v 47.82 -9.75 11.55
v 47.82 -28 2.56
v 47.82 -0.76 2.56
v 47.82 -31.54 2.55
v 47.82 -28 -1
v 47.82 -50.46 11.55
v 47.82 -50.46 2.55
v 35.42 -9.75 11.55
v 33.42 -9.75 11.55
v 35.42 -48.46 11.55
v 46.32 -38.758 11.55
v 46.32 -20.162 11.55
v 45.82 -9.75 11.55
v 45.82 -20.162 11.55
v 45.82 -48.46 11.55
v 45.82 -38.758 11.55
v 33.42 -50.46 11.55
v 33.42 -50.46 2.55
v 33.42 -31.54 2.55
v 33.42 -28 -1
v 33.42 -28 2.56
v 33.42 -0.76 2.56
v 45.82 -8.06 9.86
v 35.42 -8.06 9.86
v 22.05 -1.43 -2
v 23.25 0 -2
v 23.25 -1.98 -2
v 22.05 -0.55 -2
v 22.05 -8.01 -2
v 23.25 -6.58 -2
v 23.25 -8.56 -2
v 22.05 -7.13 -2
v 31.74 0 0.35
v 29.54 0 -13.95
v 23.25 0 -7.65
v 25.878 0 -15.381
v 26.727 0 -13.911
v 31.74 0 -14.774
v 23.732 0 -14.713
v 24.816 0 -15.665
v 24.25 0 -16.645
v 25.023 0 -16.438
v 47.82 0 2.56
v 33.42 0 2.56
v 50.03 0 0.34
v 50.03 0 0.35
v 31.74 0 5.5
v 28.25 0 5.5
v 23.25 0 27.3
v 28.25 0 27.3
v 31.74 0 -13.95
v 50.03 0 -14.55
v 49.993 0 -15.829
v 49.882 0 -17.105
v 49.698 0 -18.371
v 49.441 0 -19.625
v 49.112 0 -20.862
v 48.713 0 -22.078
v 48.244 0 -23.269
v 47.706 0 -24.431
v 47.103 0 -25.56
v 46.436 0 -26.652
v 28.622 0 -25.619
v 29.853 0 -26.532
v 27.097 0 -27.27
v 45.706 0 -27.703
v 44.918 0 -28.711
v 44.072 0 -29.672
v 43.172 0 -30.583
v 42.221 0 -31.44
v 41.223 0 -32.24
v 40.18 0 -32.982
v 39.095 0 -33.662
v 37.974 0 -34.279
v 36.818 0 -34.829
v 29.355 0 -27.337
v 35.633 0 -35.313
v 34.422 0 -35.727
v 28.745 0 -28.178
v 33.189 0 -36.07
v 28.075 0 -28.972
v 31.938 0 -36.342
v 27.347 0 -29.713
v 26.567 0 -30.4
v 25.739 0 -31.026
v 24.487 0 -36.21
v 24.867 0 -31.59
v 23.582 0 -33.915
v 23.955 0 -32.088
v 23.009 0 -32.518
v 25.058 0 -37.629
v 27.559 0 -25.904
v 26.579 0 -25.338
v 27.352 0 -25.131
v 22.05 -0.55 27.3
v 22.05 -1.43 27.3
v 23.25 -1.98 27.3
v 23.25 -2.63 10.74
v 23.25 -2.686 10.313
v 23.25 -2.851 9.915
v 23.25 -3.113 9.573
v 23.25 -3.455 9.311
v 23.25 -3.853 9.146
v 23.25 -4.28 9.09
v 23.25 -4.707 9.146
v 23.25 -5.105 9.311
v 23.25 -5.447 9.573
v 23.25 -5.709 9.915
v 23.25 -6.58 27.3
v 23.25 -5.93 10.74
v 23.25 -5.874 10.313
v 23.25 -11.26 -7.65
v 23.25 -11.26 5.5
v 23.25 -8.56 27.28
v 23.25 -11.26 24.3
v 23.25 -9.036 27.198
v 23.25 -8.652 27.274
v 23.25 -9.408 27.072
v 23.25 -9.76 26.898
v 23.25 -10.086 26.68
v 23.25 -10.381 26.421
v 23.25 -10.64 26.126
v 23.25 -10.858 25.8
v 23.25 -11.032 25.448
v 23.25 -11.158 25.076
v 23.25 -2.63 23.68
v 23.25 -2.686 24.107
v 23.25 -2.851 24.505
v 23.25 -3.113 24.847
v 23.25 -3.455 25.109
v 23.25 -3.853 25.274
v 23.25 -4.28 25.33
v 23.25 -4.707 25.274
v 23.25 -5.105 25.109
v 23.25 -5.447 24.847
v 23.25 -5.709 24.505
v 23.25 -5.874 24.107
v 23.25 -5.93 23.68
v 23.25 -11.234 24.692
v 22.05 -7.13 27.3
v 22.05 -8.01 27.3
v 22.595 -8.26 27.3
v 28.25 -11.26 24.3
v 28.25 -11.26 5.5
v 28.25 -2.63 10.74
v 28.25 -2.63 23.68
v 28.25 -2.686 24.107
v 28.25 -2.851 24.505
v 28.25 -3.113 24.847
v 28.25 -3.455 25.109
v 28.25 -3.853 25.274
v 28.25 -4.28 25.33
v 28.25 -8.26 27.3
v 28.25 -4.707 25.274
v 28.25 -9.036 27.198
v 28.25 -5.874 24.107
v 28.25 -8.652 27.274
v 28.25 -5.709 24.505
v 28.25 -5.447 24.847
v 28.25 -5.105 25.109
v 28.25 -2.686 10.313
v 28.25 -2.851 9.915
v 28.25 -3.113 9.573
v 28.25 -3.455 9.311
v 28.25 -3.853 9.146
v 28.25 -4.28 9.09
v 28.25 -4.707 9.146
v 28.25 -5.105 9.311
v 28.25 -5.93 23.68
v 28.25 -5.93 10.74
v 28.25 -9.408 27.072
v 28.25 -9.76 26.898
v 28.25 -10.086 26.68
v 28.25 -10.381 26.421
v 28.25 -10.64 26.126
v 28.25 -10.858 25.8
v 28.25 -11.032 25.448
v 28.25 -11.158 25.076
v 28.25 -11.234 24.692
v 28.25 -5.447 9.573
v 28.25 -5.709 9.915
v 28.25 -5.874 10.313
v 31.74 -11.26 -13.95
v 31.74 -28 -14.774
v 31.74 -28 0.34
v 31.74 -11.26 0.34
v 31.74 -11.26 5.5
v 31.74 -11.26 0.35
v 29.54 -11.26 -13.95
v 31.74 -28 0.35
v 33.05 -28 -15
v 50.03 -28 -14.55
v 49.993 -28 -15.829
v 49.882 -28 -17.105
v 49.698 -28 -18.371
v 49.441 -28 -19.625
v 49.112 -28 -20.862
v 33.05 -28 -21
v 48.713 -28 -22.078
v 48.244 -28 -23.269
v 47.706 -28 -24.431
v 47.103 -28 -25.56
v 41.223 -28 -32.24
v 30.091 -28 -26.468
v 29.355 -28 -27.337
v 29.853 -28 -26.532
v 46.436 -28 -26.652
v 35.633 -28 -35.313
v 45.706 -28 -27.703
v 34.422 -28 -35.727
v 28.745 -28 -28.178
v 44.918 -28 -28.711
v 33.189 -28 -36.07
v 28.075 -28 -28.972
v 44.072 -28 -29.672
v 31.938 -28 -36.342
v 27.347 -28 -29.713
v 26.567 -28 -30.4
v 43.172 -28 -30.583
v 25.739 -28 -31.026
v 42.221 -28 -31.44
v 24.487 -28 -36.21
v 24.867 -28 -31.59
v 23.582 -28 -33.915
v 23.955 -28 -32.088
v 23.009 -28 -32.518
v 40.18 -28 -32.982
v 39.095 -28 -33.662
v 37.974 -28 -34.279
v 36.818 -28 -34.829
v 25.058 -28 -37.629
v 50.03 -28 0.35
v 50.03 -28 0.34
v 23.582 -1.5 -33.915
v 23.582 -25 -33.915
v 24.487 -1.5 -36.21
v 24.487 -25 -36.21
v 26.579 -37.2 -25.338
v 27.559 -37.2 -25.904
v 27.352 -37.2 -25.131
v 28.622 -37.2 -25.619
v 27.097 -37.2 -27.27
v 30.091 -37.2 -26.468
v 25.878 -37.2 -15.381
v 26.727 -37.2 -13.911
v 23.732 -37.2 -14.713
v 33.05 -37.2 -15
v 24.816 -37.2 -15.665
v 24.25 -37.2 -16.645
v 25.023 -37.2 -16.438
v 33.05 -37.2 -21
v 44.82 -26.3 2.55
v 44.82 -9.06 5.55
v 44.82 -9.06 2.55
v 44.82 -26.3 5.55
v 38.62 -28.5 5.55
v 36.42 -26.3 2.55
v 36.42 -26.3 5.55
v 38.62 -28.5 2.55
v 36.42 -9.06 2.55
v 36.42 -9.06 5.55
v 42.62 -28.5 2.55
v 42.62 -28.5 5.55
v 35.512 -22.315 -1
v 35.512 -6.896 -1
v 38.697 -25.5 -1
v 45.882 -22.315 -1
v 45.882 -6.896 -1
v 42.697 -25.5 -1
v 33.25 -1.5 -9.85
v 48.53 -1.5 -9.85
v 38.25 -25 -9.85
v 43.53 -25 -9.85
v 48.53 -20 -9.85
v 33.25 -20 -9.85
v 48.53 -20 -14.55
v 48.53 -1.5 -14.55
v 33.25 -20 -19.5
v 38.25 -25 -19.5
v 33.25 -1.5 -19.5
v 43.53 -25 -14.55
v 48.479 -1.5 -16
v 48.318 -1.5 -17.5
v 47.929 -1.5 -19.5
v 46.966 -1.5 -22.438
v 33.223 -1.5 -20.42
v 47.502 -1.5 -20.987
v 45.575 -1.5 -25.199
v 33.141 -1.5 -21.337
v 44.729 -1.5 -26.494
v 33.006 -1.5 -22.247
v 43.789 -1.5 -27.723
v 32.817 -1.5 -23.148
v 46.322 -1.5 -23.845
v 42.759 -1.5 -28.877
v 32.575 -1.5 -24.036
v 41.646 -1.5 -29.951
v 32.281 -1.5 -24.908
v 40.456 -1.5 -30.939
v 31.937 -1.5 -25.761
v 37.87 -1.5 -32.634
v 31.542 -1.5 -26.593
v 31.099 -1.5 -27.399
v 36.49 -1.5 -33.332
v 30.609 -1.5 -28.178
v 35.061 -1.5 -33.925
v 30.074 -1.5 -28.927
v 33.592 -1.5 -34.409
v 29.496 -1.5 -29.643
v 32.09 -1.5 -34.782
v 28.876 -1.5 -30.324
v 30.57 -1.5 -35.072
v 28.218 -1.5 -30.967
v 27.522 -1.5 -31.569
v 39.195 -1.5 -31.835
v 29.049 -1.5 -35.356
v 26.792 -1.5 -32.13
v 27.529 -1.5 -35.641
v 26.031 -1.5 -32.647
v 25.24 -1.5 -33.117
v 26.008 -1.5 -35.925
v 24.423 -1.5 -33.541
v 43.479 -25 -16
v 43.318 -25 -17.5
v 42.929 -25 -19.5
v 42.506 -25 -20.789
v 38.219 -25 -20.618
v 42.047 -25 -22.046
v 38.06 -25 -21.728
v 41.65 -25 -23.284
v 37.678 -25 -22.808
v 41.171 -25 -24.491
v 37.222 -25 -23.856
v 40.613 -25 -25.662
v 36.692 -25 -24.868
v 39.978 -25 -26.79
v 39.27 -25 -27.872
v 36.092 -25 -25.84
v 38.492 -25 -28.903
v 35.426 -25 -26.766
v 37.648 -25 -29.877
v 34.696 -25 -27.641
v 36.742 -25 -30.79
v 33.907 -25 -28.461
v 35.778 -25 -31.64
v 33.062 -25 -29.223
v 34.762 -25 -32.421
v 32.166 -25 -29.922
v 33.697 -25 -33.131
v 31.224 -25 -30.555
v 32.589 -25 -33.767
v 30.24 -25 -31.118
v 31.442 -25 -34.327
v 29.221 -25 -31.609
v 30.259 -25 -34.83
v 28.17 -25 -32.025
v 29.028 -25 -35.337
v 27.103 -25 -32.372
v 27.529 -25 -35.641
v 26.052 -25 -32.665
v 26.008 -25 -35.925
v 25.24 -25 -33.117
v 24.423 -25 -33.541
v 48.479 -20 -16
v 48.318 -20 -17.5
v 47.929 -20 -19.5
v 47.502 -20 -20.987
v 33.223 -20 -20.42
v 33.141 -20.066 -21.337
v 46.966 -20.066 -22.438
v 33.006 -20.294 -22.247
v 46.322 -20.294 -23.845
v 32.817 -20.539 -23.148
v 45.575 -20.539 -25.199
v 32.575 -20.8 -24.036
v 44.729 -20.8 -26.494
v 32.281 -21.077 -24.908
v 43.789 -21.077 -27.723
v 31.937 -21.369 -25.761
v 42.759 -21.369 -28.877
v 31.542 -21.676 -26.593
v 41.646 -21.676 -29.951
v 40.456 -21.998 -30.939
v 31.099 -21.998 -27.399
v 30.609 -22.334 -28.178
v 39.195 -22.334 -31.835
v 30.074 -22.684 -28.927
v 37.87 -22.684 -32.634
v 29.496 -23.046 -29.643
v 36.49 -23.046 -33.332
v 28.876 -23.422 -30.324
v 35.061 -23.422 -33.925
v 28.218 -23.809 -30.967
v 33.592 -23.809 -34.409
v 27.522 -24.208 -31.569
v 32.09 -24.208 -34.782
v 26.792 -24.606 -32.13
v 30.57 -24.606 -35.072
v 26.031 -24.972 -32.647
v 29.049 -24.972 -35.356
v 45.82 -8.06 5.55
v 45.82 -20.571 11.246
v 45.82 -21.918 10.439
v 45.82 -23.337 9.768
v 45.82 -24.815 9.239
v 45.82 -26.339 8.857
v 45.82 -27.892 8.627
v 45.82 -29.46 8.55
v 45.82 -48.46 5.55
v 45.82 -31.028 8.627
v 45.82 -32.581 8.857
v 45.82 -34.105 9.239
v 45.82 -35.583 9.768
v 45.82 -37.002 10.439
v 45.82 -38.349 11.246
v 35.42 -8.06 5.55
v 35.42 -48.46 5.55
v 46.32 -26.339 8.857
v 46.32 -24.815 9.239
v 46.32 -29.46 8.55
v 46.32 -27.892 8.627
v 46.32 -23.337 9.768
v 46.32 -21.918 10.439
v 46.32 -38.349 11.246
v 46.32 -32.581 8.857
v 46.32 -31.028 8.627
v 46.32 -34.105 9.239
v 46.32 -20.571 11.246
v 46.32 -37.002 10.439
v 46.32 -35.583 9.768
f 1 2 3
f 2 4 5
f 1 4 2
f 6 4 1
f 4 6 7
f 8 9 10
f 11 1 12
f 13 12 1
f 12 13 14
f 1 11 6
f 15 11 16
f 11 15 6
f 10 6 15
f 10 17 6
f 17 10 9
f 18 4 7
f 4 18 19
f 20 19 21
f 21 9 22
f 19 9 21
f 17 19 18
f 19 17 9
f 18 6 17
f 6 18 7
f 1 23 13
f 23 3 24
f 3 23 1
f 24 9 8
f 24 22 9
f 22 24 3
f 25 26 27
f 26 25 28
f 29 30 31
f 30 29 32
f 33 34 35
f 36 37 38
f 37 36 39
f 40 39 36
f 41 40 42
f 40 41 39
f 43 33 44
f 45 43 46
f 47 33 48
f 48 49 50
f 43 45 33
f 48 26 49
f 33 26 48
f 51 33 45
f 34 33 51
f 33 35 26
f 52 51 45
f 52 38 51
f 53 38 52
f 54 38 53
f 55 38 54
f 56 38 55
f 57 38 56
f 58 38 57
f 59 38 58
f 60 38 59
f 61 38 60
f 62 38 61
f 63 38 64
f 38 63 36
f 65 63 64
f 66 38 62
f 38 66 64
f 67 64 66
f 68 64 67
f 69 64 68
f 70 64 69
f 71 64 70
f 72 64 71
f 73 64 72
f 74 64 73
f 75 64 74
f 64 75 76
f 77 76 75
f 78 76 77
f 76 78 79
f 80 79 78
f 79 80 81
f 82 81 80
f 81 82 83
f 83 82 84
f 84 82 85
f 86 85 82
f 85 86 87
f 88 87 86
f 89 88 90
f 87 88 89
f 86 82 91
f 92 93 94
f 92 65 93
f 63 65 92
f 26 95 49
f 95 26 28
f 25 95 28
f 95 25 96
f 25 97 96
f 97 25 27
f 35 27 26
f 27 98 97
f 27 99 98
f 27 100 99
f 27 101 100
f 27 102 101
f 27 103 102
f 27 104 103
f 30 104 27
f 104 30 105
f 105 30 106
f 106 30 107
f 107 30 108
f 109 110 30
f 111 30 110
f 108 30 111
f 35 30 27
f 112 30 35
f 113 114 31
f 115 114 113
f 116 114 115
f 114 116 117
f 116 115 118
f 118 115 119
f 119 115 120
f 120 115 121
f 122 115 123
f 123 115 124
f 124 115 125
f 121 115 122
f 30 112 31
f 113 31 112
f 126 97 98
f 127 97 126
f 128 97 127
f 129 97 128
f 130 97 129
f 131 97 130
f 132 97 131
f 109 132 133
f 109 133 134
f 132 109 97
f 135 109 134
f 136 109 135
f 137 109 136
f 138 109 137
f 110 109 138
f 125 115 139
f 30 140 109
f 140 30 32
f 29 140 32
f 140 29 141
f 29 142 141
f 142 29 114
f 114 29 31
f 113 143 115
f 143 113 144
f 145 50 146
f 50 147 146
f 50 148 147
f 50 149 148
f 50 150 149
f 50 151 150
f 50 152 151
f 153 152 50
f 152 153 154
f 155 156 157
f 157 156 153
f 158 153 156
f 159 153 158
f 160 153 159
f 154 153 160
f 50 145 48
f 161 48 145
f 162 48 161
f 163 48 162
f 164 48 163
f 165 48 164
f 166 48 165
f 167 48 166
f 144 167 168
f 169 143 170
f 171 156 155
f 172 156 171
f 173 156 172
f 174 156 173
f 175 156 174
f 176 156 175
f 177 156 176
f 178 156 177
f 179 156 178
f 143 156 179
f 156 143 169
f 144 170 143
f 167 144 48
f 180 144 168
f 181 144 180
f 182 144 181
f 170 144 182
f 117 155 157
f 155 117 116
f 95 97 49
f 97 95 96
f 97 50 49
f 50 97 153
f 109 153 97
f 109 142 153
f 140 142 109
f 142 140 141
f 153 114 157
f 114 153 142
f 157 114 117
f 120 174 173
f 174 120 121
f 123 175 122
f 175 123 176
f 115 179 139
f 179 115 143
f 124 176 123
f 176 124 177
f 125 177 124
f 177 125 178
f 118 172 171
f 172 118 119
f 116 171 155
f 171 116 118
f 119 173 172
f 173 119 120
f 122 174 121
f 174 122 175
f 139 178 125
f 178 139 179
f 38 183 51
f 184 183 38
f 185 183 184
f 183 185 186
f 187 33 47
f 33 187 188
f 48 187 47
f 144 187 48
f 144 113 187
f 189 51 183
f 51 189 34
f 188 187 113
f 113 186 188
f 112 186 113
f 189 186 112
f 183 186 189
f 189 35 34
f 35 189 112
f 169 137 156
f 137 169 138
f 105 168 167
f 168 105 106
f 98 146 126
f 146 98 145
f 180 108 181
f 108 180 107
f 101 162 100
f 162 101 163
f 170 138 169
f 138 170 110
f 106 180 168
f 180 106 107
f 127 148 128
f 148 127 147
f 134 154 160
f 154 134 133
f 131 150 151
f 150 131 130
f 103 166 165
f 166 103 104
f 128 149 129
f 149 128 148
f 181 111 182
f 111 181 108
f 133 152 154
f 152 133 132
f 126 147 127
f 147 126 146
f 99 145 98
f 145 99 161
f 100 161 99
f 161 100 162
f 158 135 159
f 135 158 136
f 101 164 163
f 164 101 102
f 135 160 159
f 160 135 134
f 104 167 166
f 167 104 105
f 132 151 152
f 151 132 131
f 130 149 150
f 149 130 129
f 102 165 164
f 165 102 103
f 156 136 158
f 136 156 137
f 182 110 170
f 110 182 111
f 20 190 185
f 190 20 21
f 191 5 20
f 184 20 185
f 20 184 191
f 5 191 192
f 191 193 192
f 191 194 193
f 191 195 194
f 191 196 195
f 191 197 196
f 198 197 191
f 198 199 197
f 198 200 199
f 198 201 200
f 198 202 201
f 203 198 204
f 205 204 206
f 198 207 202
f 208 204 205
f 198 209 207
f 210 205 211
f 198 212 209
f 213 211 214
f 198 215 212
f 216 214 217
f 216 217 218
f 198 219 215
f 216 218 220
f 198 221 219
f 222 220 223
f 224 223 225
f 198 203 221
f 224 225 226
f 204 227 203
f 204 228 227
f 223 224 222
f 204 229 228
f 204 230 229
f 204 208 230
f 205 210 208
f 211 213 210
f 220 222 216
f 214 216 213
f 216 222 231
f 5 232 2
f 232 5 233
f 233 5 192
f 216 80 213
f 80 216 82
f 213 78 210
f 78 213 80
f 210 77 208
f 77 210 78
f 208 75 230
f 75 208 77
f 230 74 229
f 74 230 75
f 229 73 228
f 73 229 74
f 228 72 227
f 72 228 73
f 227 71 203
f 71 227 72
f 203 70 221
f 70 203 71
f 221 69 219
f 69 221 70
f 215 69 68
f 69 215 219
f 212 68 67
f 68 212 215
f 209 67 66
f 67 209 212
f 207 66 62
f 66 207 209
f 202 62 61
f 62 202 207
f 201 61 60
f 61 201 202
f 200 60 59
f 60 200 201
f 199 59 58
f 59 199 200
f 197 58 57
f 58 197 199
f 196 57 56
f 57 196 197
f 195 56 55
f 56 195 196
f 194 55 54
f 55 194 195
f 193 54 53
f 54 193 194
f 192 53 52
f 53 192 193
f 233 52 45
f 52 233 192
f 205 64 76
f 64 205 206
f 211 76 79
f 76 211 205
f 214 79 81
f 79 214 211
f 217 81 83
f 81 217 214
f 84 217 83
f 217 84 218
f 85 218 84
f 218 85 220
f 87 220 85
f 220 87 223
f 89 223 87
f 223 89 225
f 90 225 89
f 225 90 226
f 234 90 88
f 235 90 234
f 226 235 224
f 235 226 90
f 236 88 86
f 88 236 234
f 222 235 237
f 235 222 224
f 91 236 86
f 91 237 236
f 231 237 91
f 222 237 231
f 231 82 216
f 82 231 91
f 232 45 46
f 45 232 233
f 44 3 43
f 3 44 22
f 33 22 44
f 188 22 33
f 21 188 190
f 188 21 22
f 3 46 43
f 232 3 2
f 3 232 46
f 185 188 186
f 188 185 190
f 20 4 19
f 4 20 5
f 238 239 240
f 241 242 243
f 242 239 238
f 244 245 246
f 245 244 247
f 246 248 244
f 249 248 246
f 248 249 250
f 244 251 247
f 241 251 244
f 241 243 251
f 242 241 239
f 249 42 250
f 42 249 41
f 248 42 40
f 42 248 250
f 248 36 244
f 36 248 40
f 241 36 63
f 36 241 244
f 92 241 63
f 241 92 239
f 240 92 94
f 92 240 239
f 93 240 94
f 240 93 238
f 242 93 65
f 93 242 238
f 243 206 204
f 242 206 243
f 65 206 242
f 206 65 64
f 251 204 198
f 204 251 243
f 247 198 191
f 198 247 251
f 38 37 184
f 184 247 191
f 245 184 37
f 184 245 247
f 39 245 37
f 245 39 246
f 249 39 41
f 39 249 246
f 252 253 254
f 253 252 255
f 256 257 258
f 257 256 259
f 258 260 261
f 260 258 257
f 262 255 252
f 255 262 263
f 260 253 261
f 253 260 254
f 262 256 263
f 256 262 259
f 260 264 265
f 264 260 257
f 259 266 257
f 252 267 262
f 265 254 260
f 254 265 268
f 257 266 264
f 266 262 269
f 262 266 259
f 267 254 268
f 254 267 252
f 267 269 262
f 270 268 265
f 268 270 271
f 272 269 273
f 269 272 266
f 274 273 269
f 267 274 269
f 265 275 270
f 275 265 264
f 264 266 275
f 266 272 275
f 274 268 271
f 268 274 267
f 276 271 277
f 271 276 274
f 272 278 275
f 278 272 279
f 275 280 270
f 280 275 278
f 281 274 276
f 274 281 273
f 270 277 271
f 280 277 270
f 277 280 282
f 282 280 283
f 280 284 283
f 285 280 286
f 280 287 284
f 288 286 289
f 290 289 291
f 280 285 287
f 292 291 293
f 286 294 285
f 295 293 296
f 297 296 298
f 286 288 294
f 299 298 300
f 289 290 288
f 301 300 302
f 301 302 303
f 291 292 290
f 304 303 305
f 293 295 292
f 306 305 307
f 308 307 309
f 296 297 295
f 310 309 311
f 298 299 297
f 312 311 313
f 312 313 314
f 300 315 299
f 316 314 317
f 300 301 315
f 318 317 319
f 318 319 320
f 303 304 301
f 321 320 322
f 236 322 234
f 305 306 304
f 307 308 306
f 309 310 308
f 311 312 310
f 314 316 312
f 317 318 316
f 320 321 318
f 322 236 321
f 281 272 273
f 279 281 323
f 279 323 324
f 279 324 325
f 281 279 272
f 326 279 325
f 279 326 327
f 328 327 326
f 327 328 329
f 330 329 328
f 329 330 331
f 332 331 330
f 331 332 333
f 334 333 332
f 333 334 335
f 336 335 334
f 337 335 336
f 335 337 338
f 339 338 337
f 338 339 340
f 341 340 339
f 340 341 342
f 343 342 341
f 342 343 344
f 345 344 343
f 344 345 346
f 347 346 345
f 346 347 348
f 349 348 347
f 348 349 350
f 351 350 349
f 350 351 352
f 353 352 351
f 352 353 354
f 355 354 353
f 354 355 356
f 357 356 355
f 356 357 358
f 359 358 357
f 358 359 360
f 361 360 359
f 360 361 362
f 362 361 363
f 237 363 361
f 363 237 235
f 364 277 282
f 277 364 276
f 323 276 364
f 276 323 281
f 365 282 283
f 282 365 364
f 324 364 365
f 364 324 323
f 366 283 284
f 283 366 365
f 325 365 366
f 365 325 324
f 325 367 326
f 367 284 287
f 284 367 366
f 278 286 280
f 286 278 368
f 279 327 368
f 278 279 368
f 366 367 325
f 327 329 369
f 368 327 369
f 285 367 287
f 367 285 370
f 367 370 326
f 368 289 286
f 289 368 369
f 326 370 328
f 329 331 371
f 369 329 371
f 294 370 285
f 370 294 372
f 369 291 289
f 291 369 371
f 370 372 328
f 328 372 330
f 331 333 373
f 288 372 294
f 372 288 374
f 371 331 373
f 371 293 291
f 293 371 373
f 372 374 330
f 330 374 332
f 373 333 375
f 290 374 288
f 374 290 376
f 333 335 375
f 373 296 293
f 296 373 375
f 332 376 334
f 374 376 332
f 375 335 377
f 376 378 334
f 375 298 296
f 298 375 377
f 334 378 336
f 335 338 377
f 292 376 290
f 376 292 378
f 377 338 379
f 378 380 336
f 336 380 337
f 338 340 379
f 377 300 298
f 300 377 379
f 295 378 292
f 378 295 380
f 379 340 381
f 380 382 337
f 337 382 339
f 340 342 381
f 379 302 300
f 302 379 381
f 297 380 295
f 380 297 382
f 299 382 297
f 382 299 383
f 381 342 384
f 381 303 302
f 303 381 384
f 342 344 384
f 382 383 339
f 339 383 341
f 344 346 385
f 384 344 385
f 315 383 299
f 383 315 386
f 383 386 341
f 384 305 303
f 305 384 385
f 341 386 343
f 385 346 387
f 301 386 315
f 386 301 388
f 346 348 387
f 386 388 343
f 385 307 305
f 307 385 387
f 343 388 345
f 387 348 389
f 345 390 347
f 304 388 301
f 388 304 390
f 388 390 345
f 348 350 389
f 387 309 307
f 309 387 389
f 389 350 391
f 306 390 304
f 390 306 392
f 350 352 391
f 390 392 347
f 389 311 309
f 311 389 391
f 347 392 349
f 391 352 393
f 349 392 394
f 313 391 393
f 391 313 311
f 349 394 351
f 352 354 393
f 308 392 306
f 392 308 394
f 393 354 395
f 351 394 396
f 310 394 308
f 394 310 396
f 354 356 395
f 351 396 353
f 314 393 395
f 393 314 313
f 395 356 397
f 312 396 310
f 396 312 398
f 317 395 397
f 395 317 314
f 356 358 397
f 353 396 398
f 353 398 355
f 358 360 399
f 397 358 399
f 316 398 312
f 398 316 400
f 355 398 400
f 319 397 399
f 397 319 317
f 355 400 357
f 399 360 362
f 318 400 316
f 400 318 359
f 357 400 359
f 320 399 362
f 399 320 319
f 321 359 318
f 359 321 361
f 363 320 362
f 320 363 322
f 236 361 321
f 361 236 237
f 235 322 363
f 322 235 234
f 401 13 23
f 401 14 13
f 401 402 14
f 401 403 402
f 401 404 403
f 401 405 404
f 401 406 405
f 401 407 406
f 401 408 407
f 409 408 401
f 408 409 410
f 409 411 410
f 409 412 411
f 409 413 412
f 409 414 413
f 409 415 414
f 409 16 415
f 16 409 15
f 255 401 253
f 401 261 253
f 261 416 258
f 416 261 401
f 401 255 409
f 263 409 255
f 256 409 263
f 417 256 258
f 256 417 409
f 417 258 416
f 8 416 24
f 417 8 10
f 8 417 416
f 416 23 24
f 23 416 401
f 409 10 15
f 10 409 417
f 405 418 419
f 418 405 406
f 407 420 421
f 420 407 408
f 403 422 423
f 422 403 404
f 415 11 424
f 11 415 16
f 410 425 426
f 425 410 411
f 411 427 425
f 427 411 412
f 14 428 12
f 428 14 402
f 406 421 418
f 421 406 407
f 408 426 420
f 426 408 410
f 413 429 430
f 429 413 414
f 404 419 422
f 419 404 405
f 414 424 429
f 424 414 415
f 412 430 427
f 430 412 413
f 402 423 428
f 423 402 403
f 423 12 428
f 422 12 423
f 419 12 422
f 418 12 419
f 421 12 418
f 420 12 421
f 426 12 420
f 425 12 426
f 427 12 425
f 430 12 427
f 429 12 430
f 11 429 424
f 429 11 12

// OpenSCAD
// file: lib/duct_body.scad
// Body of the one-piece 4010 ducts — Igneus V2 (Anet ET4/ET5)
// Remix of "IGNEUS V2 - E3D V6/VOLCANO" by Locos3D, CC BY-NC-SA 4.0
// https://www.thingiverse.com/thing:4178590
//
// Same frame as duct4010.scad: right-hand part as mounted, Z+ up, X- towards the nozzle, Y- = front.
// Drawn from scratch as a single part: the curves of the air channel, the rails of the mounting arm and its
// height slot are measured from Locos3D's 5015 duct, so it mounts and aims the air like the original.
// It prints lying on its flat back face (y = 0) without supports: every wall is a prism standing on that
// face or rises at 45 degrees, and what is left as a ceiling is a short bridge.

/* [Internal: one-piece duct body] */
// air channel in the XZ plane: inner wall (nozzle side) and outer wall, both arcs ending in the outlet
ch_near_c  = [-18.38, -19.50];   // centre of the inner wall curve
ch_near_r  = [14.07, 15.58];     // its outer face (towards the nozzle) and channel face
ch_near_a  = 67.7;               // the inner wall ends this many degrees below the horizontal
ch_far_c   = [-8.19, -14.55];    // centre of the outer wall curve
ch_far_r   = [20.67, 22.17];     // its channel face and outer face
ch_far_a   = 79.4;               // the curve ends here and a straight lip aims the air at the nozzle
ch_lip     = [7.3, 7.0];         // lip length: channel face, outer face
ch_back    = -1.5;               // channel back face: 1.5 mm wall on the face it prints on
ch_front   = -25.0;              // channel front face: 3 mm front wall
duct_d     = 28.0;               // depth of the duct (Y)
duct_top   = -9.85;              // top of the curved duct = where the air comes in
roof_c     = 5.0;                // 45° chamfers along the front edges of the channel...
roof_ridge = 4.0;                // ...leaving a flat strip this wide (a short bridge when printing)

// mounting arm: rails that slide into the body's grooves and the slot of the height-adjustment screw
arm_x      = [-12.8, -7.8];      // arm face against the body / outer face (the screw head bears on it)
arm_d      = 11.26;              // arm depth (Y)
arm_top    = 27.3;               // top of the arm
rail_tip   = -14.0;              // the rails stick out of the arm face up to here
rails      = [[0, 1.98], [6.58, 8.56]];   // rail bases (depth from the back face); tips 0.55 mm narrower each side
slot_y     = -4.28;              // height slot: centre (Y), width and the Z range of the screw
slot_w     = 3.3;
slot_z     = [9.09, 25.33];
spine_top  = 5.5;                // the block that joins arm and duct stays under the screw head

// derived: straight faces of the walls
near_out_x = ch_near_c[0] + ch_near_r[0];   // -4.31
near_in_x  = ch_near_c[0] + ch_near_r[1];   // -2.80
far_in_x   = ch_far_c[0] + ch_far_r[0];     // 12.48
far_out_x  = ch_far_c[0] + ch_far_r[1];     // 13.98

function pol(c, r, a) = [c[0] + r * cos(a), c[1] + r * sin(a)];
function lerp(a, b, t) = a + (b - a) * t;
function cw_dir(a) = [sin(a), -cos(a)];     // tangent of a circle at angle a, going clockwise
function seg_n(n) = [for (i = [0 : n]) i / n];

// outer wall, channel face: straight, then the arc, then the lip; f = 0..1 from the height of the inner
// wall's centre (where the inner wall starts to curve) to the tip of the lip
far_a0    = asin((ch_near_c[1] - ch_far_c[1]) / ch_far_r[0]);
far_arc_l = ch_far_r[0] * (ch_far_a + far_a0) * PI / 180;
function far_pt(f) = let(s = f * (far_arc_l + ch_lip[0]))
    s <= far_arc_l ? pol(ch_far_c, ch_far_r[0], far_a0 - s / ch_far_r[0] * 180 / PI)
                   : pol(ch_far_c, ch_far_r[0], -ch_far_a) + (s - far_arc_l) * cw_dir(-ch_far_a);
function near_pt(f) = pol(ch_near_c, ch_near_r[1], -f * ch_near_a);
function far_x_at(z) = z >= ch_far_c[1] ? far_in_x : ch_far_c[0] + sqrt(pow(ch_far_r[0], 2) - pow(z - ch_far_c[1], 2));

// Cross-section of the air path: the line from a (inner side) to b (outer side) in XZ, swept in Y from the
// back face yb to the front face yf, with the two front edges chamfered at 45 degrees by c.
function sec(a, b, yb = ch_back, yf = ch_front, c = roof_c) = [a, b, yb, yf, c];
function sec_pts(s) = let(a = s[0], b = s[1], yb = s[2], yf = s[3], l = norm(b - a), u = (b - a) / l,
                          c = min(s[4], max(0, (l - roof_ridge) / 2)))
    [[a[0], yb, a[1]], [b[0], yb, b[1]], [b[0], yf + c, b[1]],
     [b[0] - c * u[0], yf, b[1] - c * u[1]], [a[0] + c * u[0], yf, a[1] + c * u[1]], [a[0], yf + c, a[1]]];

// solid between consecutive cross-sections (each piece is convex, neighbours share a face)
module loft(secs) for (i = [0 : len(secs) - 2])
    hull() polyhedron(points = concat(sec_pts(secs[i]), sec_pts(secs[i + 1])),
                      faces = [[0, 1, 2, 3, 4, 5], [6, 7, 8, 9, 10, 11]]);

// The curved duct, from its top (duct_top) to 1.5 mm past the outlet
function duct_secs(n = 20) = concat(
    [for (z = [duct_top, -12, ch_far_c[1], -16, -17.5, ch_near_c[1]]) sec([near_in_x, z], [far_x_at(z), z])],
    [for (f = seg_n(n)) if (f > 0) sec(near_pt(f), far_pt(f))],
    [sec(near_pt(1) + 1.5 * cw_dir(-ch_near_a), far_pt(1) + 1.5 * cw_dir(-ch_far_a))]);

module duct_channel() loft(duct_secs());

// XZ outline of the duct walls, from z_top down to the outlet
module duct_outline(z_top = duct_top) {
    a_near = -ch_near_a;
    lip_out_end = pol(ch_far_c, ch_far_r[1], -ch_far_a) + ch_lip[1] * cw_dir(-ch_far_a);
    polygon(concat(
        [[near_out_x, z_top]],
        [for (f = seg_n(16)) pol(ch_near_c, ch_near_r[0], -f * ch_near_a)],   // inner wall, nozzle side
        [pol(ch_near_c, ch_near_r[1], a_near)],                              // its end, across the wall
        [far_pt(1)],                                                         // across the outlet
        [lip_out_end],                                                       // end of the lip
        [for (f = seg_n(24)) pol(ch_far_c, ch_far_r[1], -ch_far_a * (1 - f))],   // outer wall, back up
        [[far_out_x, z_top]]));
}

// the duct walls as a prism standing on the back face
module duct_shell(z_top = duct_top) rotate([90, 0, 0]) linear_extrude(height = duct_d) duct_outline(z_top);

// Arm profile in XY (rails on the face against the body)
module arm_profile() {
    teeth = [for (r = rails) each [[arm_x[0], -r[0]], [rail_tip, -r[0] - 0.55], [rail_tip, -r[1] + 0.55], [arm_x[0], -r[1]]]];
    polygon(concat([[arm_x[1], 0], [arm_x[1], -arm_d], [arm_x[0], -arm_d]], [for (i = [len(teeth) - 1 : -1 : 0]) teeth[i]]));
}

// Mounting arm: the rails slide into the grooves on the side of the Igneus body and the M3 screw goes through
// the height slot into the body. The spine joins it to the duct, below the screw head.
module mount_arm() {
    difference() {
        union() {
            intersection() {
                translate([0, 0, -2]) linear_extrude(height = arm_top + 2) arm_profile();
                // round the top front corner (the back corner stays square: it sits on the bed)
                rotate([90, 0, 90]) translate([0, 0, -20]) linear_extrude(height = 20)
                    offset(r = 3) offset(delta = -3) translate([-arm_d, -10]) square([arm_d + 3, arm_top + 10]);
            }
            // spine: from the arm to the inner wall of the duct, chamfered under the arm
            rotate([90, 0, 0]) linear_extrude(height = arm_d)
                polygon([[arm_x[0], spine_top], [near_out_x, spine_top], [near_out_x, duct_top - 4.1],
                         [near_out_x - 2.2, duct_top - 4.1], [arm_x[0], duct_top + 2.2]]);
        }
        slot();
    }
}

module slot()
    hull() for (z = [slot_z[0] + slot_w / 2, slot_z[1] - slot_w / 2])
        translate([arm_x[0] - 2.5, slot_y, z]) rotate([0, 90, 0]) cylinder(d = slot_w, h = arm_x[1] - arm_x[0] + 5, $fn = 24);
// main file
// color: #1d1d1f
// variant: onepiece
// One-piece 4010 duct with the LED channel, right side (as mounted). Replaces the original 5015 duct and the adapter.
include <lib/duct4010.scad>

translate([36.05, 0, 0]) duct4010();
